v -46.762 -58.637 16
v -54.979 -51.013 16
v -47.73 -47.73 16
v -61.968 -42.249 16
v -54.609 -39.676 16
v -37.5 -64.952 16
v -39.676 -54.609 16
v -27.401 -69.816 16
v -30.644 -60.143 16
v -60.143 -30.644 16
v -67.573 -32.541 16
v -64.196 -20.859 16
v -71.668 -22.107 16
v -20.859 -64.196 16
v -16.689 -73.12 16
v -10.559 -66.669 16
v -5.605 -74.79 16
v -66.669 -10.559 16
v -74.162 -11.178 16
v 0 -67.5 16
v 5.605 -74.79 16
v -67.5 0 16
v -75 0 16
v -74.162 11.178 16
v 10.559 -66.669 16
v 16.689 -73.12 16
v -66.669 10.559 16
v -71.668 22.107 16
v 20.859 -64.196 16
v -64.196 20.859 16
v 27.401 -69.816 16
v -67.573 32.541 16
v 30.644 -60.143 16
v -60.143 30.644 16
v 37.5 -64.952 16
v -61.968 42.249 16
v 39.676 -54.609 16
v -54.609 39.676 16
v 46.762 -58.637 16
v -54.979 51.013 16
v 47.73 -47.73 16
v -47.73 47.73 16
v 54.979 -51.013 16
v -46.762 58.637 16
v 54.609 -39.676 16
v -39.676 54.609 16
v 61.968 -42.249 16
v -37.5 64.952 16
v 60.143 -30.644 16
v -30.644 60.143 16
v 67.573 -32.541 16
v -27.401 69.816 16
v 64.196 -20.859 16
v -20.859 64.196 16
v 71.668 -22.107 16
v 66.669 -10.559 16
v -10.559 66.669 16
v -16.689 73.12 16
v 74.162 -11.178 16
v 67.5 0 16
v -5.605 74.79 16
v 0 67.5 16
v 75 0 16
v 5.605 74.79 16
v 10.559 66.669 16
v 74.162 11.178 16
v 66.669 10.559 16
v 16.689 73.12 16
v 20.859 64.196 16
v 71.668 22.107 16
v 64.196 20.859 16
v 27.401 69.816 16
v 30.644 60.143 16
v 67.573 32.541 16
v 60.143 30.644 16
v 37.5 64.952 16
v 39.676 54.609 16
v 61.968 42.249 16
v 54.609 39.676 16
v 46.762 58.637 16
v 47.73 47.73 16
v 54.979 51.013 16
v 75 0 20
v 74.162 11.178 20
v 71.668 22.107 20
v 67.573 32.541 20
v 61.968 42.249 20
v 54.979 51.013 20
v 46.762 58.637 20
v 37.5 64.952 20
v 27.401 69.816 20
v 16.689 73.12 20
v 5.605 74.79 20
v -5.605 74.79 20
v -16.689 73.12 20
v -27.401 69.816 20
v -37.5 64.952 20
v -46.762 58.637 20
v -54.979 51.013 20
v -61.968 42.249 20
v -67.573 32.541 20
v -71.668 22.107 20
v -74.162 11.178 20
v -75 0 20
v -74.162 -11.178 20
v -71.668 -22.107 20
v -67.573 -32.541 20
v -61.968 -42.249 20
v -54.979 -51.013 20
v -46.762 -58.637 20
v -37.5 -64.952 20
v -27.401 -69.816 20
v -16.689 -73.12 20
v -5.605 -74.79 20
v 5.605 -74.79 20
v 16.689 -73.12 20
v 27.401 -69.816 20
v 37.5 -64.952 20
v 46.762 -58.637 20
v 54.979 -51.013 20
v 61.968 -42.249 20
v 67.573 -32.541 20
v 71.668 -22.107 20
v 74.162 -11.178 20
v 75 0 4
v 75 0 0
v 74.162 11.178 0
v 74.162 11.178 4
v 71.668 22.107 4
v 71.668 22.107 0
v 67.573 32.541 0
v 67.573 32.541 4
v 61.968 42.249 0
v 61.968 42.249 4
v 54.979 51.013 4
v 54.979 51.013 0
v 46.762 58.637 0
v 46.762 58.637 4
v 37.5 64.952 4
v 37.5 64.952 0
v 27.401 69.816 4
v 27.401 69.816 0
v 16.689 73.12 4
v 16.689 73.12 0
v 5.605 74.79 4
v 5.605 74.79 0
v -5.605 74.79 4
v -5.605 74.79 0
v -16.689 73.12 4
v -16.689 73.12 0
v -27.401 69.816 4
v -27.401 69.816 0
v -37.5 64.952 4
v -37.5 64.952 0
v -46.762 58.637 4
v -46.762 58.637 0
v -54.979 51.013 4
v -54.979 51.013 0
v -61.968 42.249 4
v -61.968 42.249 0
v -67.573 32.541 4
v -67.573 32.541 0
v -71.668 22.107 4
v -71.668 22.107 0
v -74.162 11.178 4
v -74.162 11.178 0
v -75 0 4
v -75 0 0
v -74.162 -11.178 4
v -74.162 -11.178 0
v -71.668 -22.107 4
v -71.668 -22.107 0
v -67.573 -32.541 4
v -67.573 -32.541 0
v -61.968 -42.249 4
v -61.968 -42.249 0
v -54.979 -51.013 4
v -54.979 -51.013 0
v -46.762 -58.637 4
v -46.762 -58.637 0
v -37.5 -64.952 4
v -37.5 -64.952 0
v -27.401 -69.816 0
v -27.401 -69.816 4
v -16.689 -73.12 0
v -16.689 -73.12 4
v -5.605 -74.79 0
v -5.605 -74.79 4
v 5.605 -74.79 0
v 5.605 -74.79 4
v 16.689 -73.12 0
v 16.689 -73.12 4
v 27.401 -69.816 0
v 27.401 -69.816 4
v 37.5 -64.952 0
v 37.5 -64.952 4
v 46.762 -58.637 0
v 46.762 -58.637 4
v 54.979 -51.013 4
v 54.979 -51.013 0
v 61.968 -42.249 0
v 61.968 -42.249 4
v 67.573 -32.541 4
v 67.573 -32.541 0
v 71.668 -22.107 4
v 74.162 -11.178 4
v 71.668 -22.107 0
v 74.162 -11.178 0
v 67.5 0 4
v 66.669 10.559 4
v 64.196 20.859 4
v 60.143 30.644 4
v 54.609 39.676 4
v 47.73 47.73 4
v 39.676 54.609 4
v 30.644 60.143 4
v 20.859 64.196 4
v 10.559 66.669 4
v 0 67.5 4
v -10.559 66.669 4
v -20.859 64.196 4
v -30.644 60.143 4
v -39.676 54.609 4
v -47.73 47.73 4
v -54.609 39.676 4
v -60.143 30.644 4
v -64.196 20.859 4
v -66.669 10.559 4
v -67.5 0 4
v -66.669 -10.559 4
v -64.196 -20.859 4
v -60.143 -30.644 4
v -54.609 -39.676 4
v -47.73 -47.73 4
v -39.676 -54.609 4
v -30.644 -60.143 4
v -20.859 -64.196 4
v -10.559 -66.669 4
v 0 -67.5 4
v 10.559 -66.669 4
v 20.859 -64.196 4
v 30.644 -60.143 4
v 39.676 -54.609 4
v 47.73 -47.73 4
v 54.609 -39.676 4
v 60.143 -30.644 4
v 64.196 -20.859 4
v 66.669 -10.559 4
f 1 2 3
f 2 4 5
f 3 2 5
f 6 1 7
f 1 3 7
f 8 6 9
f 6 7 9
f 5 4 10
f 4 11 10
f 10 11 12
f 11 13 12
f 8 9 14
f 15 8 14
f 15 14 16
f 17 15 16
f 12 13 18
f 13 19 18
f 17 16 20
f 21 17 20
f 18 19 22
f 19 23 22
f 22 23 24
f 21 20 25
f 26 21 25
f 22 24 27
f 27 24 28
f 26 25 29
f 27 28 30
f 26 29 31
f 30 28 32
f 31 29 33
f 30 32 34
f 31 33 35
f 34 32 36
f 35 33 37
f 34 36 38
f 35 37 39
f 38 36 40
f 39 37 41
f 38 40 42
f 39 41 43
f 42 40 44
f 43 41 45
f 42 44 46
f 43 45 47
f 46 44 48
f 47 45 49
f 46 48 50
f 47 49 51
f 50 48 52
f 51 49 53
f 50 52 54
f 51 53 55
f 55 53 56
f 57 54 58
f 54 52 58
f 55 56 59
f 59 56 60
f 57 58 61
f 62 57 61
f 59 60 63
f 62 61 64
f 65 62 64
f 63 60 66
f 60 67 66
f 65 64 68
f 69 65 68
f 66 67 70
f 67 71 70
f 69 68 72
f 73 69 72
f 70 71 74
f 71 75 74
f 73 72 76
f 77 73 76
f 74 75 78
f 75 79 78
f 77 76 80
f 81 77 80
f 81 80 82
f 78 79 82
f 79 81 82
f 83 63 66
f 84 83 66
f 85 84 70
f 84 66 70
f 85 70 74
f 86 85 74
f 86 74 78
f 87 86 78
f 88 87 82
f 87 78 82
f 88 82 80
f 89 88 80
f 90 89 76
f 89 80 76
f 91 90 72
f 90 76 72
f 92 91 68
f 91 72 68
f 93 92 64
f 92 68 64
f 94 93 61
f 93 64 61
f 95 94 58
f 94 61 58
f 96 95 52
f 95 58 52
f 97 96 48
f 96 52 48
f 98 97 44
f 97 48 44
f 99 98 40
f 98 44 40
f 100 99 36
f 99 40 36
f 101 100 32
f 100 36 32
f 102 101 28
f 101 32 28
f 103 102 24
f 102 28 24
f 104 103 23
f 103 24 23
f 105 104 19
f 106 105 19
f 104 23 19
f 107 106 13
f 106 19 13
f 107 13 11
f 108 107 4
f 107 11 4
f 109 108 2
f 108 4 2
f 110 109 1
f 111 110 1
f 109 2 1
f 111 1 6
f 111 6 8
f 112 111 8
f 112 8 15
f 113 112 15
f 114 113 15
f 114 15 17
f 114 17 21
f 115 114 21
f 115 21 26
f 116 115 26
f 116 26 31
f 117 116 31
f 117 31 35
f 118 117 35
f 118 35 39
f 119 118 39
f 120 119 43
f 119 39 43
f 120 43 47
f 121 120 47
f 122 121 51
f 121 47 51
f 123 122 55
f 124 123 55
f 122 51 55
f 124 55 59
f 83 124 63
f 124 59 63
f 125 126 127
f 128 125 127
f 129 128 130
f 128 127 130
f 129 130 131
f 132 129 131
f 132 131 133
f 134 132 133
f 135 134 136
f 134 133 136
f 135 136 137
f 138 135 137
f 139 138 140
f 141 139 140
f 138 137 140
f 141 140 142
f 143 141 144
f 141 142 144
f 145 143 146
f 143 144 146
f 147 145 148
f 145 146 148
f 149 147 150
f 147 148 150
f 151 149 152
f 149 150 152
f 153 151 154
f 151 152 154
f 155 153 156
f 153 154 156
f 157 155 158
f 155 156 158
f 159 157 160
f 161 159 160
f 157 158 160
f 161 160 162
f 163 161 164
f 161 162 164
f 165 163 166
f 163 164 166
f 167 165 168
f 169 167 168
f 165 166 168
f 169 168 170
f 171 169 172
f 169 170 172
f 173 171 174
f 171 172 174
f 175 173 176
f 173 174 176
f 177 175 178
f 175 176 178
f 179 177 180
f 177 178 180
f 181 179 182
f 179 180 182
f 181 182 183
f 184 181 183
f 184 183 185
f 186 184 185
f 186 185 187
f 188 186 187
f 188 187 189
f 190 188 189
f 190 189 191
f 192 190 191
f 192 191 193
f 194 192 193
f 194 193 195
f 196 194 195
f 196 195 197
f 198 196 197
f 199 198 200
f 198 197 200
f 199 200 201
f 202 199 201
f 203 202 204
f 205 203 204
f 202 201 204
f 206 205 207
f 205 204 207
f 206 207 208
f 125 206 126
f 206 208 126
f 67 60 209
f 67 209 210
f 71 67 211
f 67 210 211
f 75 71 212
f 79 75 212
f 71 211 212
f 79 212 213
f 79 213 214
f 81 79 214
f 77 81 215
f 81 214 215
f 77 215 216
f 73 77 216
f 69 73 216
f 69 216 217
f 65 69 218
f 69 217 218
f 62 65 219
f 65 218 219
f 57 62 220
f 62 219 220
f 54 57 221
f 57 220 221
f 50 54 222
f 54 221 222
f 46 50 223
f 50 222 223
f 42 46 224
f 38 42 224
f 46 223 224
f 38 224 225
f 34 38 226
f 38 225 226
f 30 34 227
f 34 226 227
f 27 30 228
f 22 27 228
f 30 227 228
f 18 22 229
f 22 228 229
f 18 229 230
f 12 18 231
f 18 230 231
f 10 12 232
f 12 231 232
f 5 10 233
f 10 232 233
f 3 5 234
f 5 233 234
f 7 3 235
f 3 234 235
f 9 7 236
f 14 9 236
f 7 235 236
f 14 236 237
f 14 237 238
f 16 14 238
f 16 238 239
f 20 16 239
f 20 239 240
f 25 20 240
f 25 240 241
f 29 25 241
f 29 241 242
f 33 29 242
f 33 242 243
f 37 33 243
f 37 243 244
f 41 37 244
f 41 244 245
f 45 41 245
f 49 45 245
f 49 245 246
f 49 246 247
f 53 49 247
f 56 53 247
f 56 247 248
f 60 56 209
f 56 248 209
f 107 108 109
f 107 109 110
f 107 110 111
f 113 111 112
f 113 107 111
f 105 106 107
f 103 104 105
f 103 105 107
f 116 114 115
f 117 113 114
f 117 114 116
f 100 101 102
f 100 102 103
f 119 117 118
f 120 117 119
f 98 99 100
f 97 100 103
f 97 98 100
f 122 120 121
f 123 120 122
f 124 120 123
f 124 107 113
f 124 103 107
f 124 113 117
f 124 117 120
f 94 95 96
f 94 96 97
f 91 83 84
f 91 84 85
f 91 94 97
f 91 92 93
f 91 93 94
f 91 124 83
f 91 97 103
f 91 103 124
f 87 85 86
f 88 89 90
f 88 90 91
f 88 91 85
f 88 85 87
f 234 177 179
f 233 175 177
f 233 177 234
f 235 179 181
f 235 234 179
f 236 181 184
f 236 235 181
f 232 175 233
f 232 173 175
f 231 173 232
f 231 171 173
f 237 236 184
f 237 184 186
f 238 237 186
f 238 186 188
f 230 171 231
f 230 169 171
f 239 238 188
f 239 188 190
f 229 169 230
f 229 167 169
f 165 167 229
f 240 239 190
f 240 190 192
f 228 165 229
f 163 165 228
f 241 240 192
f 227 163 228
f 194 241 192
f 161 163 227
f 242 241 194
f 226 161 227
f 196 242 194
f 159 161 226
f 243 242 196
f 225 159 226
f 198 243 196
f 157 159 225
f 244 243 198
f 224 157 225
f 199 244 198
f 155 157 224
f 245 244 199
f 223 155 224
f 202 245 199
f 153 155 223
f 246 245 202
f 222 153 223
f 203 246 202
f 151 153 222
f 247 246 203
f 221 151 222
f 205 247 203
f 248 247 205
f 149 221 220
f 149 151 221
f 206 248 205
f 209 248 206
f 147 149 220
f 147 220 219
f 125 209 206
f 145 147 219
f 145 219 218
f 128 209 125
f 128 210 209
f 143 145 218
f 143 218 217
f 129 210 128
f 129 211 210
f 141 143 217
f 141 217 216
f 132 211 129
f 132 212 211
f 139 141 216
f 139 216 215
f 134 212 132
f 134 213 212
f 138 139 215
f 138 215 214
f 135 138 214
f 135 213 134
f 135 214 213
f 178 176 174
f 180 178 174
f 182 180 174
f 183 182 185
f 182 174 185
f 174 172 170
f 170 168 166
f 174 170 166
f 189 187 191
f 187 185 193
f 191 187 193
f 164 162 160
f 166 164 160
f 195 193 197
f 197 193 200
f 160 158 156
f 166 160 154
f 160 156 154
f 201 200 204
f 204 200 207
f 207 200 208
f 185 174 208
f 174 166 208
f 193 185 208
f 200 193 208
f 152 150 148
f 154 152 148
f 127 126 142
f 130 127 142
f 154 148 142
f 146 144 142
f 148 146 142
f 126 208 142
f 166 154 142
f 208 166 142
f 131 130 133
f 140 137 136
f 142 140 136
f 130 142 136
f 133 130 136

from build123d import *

# Parameters (mm, degrees)
F2_R     = 75
F3_DEPTH = 4
F5_R     = 67.5
F6_DEPTH = 12
F8_R     = 75
F9_DEPTH = 4


with BuildPart() as f3:
    # F2 (on Top) → F3 (new body)
    with BuildSketch(Plane.XY):
        Circle(F2_R)
    extrude(amount=F3_DEPTH)

    # F5 (on offset) → F6 (join)
    with BuildSketch(Plane.XY.offset(4)):
        Circle(F5_R)
    extrude(amount=F6_DEPTH)

    # F8 (on offset) → F9 (join)
    with BuildSketch(Plane.XY.offset(16)):
        Circle(F8_R)
    extrude(amount=F9_DEPTH)


with BuildPart() as f10_1:
    # F10: copy of F3
    add(f3.part.moved(Location((0, 0, 20))))


with BuildPart() as f12_1:
    # F12: copy of F3
    add(f3.part)


solid = f3.part
